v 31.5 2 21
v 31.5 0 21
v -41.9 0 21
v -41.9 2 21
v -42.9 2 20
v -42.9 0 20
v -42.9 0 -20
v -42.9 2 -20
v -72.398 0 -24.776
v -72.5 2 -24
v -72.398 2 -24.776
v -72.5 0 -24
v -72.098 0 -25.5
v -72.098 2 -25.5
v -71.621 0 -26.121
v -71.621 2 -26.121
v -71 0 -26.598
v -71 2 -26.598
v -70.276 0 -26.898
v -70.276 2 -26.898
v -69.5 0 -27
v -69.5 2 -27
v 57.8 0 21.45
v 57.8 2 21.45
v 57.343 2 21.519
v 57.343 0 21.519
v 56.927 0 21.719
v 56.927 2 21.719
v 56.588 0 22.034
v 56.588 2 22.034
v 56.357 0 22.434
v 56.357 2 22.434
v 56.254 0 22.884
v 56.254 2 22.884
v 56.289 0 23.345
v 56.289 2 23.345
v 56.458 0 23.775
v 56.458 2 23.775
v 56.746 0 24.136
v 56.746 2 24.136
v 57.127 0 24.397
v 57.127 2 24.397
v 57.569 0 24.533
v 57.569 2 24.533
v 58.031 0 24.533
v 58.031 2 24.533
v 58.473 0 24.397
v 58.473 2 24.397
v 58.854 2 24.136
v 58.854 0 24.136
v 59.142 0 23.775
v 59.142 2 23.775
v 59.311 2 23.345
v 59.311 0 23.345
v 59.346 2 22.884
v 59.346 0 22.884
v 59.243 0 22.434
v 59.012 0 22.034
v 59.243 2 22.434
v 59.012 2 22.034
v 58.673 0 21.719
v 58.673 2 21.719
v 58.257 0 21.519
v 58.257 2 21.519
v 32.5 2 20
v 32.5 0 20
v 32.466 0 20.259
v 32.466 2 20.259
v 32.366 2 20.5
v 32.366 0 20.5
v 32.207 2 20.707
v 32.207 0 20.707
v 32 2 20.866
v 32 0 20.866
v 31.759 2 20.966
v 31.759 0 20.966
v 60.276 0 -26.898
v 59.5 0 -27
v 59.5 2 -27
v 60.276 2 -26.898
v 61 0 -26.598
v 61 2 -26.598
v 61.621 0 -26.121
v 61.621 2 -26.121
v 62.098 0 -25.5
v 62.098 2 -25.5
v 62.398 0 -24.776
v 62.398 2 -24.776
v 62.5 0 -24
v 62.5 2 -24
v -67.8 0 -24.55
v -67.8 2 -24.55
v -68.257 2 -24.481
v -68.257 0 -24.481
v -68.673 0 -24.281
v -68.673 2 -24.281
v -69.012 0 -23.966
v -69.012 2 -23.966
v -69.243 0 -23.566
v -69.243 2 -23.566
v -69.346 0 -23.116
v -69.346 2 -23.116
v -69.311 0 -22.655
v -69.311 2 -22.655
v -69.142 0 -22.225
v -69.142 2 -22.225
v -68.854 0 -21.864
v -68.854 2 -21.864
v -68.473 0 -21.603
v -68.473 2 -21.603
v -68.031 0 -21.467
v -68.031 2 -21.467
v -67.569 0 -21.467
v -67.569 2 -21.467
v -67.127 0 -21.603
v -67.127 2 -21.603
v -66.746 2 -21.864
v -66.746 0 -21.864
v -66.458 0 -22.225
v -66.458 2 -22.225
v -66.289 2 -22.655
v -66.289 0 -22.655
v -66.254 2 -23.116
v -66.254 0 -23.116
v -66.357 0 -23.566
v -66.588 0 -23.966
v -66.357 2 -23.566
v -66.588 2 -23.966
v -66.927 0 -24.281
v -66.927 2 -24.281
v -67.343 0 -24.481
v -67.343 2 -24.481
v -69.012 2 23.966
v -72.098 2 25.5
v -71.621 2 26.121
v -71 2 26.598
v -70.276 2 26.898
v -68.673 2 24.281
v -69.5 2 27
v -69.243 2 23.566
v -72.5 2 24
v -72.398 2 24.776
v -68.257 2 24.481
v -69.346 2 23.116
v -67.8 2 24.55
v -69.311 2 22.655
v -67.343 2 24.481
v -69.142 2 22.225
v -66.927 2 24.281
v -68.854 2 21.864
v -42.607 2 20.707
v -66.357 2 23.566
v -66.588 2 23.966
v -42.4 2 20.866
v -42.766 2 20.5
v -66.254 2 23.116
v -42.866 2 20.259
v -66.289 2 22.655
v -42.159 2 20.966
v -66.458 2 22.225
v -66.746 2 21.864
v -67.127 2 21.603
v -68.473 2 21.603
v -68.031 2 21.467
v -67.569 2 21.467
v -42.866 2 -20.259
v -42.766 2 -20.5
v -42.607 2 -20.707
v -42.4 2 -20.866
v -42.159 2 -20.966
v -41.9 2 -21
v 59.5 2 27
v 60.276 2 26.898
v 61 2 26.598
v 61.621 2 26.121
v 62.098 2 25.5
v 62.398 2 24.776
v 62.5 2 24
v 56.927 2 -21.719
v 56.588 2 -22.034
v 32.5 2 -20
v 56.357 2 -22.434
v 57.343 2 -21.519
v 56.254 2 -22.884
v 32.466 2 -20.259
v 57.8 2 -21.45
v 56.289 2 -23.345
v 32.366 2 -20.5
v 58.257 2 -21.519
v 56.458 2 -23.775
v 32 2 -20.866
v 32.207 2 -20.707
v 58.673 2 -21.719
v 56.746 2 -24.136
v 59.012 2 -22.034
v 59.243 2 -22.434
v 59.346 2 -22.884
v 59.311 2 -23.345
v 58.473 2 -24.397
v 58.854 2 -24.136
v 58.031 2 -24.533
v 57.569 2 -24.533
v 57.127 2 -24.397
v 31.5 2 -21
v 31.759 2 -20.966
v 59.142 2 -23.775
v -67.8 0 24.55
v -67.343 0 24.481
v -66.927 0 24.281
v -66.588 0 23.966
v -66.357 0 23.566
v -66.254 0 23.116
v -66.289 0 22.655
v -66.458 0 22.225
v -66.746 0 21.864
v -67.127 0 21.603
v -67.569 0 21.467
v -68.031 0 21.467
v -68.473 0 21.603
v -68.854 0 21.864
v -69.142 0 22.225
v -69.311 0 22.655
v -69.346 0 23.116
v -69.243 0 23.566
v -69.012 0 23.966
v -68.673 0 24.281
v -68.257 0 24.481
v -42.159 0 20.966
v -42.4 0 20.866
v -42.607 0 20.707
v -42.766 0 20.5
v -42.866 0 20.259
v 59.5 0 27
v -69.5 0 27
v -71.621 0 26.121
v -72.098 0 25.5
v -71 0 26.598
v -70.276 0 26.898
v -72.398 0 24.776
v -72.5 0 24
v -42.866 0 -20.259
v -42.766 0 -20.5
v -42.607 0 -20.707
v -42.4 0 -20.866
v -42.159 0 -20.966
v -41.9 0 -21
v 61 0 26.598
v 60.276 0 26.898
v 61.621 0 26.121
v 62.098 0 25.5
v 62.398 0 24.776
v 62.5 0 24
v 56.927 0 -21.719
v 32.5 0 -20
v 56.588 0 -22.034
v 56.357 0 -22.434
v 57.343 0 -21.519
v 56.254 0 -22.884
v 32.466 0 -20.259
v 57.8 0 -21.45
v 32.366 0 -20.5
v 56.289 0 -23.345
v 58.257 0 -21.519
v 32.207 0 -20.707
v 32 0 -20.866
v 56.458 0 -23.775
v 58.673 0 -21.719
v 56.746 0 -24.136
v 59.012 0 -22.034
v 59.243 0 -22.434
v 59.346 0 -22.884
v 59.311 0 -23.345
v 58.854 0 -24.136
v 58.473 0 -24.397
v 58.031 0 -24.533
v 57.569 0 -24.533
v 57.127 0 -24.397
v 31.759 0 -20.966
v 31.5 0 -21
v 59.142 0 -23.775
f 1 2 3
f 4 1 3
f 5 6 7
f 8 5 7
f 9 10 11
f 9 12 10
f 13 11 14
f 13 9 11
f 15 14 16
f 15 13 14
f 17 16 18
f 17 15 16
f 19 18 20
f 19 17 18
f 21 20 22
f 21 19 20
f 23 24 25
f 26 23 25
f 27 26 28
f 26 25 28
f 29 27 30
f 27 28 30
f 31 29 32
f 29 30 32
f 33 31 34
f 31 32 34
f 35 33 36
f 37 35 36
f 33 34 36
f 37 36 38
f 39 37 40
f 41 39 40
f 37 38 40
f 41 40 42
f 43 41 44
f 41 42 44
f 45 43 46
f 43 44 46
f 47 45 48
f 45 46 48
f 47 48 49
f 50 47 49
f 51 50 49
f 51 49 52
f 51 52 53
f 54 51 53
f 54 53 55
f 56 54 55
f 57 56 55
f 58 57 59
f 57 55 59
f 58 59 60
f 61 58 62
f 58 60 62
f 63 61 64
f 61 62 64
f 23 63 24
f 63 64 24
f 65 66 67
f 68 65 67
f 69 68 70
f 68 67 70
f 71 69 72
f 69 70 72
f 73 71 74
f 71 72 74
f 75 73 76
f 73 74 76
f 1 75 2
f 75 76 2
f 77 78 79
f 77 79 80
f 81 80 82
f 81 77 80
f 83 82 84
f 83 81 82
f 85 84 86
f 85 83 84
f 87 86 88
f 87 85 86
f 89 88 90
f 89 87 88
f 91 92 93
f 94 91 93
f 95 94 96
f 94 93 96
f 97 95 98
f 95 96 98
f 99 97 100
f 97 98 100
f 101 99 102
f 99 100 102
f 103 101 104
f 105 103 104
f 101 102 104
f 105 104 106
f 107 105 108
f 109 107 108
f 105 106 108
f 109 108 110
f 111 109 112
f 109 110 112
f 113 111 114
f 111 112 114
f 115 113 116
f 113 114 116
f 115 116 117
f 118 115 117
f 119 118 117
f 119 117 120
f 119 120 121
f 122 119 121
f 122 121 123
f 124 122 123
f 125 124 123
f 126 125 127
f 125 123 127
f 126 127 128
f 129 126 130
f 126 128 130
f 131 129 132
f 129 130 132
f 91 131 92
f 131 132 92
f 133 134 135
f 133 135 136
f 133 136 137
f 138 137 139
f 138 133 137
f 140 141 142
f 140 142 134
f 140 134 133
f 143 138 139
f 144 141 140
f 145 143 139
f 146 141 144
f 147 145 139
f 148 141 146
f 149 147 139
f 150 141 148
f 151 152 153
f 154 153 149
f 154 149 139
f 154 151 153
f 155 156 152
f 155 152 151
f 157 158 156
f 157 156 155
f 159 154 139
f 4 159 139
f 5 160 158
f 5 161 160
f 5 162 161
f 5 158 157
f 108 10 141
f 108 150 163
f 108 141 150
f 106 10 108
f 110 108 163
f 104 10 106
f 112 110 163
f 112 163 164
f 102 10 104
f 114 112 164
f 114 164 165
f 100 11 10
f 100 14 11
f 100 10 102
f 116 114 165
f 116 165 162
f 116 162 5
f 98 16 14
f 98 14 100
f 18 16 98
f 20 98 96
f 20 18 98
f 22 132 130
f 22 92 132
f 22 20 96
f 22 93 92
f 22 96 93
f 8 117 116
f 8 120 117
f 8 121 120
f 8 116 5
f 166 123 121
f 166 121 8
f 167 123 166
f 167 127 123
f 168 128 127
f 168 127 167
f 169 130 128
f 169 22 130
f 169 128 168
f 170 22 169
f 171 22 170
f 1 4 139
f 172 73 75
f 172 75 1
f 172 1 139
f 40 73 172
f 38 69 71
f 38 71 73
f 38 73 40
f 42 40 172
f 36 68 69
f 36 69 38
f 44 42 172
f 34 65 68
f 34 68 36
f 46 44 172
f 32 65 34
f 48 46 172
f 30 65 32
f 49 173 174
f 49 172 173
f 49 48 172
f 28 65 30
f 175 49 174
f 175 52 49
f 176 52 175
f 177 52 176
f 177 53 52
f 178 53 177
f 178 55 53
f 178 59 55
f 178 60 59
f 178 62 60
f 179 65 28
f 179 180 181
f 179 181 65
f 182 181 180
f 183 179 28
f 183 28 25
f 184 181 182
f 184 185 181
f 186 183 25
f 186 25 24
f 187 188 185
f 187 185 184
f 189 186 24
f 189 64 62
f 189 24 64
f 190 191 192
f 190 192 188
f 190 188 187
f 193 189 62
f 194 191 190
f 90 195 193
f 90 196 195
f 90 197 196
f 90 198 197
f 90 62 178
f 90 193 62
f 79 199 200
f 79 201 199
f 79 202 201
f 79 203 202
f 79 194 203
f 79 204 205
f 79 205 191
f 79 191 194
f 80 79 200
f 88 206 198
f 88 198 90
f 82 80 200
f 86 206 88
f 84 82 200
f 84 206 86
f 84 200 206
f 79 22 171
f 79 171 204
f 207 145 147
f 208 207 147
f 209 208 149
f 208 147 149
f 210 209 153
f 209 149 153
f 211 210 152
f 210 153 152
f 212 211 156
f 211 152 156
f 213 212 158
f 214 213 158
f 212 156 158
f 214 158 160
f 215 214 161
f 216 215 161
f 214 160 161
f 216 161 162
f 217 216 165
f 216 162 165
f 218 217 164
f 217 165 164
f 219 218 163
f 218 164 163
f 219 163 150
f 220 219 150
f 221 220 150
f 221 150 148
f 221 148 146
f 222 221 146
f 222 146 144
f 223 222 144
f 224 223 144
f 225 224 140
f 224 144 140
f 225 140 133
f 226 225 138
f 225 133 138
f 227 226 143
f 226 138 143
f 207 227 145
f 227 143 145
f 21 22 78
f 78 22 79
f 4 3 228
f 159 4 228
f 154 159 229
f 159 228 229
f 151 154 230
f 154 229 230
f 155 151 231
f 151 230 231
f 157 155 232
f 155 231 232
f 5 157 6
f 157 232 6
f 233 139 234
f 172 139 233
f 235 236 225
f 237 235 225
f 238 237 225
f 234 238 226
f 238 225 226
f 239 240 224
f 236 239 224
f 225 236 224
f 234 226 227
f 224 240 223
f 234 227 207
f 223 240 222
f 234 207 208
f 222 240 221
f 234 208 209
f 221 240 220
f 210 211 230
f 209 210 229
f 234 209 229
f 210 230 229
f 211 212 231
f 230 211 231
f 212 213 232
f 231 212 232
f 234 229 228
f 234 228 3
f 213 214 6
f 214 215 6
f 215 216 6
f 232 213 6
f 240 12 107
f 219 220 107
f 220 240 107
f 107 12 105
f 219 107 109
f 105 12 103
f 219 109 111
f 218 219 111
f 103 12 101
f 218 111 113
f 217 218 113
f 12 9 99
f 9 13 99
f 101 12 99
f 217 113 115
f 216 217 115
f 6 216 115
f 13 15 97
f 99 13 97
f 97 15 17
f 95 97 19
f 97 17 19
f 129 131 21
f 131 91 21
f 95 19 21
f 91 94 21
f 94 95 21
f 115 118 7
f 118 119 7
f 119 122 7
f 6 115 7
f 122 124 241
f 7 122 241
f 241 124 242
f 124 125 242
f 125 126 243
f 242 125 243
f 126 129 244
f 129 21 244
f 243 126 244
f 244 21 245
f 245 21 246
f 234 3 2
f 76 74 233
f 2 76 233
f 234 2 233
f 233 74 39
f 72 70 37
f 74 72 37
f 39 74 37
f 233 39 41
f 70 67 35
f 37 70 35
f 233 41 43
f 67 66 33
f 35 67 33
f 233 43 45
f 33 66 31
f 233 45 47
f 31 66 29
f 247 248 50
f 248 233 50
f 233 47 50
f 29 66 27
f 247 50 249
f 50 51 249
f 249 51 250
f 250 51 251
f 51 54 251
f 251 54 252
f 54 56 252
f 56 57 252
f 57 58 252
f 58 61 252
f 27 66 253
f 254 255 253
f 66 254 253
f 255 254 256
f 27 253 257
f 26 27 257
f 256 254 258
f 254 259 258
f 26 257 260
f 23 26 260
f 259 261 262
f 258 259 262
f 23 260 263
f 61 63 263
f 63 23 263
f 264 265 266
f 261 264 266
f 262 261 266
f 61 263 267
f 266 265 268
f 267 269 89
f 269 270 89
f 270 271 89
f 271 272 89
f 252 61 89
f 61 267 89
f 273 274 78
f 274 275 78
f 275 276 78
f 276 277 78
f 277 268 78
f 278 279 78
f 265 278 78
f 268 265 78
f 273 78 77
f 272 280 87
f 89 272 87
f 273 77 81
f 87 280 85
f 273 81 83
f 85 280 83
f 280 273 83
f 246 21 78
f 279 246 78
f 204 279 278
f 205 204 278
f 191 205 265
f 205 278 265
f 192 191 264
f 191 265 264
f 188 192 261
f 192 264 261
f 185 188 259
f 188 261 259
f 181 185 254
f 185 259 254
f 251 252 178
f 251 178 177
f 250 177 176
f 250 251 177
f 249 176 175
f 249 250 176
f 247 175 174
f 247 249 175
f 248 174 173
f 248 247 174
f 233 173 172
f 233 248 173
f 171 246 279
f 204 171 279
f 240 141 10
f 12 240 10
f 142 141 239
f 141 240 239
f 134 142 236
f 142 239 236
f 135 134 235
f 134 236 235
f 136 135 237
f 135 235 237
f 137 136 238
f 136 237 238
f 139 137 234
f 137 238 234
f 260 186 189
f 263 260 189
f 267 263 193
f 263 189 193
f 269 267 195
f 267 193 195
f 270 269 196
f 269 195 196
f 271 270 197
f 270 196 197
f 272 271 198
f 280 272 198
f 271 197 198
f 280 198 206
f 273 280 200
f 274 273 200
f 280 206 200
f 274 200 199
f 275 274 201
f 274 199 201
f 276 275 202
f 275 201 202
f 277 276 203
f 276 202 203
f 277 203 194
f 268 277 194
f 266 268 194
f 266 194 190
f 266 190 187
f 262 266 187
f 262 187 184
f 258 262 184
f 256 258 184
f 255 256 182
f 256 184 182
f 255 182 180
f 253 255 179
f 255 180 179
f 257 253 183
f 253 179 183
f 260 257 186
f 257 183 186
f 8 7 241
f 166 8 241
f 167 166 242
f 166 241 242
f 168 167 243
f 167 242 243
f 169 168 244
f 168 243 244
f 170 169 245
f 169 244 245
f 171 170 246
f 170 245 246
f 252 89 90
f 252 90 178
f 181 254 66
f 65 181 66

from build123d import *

# Parameters (mm, degrees)
EXTRUDE_1_DEPTH     = 2
SKETCH_3_W          = 10
SKETCH_3_H          = 54
EXTRUDE_2_DEPTH     = 2
SKETCH_2_R          = 1.55
CUT_EXTRUDE_1_DEPTH = 2
FILLET_1_R          = 3


with BuildPart() as part:
    # 草图1 → 凸台-拉伸1 (new body)
    with BuildSketch(Plane(origin=(0, 0, 0), x_dir=(1, 0, 0), z_dir=(0, 1, 0))):
        with BuildLine():
            Line((-59.5, -27), (-62.5, -27))
            Line((-62.5, -27), (-62.5, -24))
            Line((-62.5, -24), (-62.5, 24))
            Line((-62.5, 24), (-62.5, 27))
            Line((-62.5, 27), (-59.5, 27))
            Line((-59.5, 27), (59.5, 27))
            ThreePointArc((59.5, 27), (61.621320344, 26.121320344), (62.5, 24))
            Line((62.5, 24), (62.5, -24))
            ThreePointArc((62.5, -24), (61.621320344, -26.121320344), (59.5, -27))
            Line((59.5, -27), (-59.5, -27))
        make_face()
        with BuildLine():
            Line((-41.9, 21), (31.5, 21))
            ThreePointArc((31.5, 21), (32.207106781, 20.707106781), (32.5, 20))
            Line((32.5, 20), (32.5, -20))
            ThreePointArc((32.5, -20), (32.207106781, -20.707106781), (31.5, -21))
            Line((31.5, -21), (-41.9, -21))
            ThreePointArc((-41.9, -21), (-42.607106781, -20.707106781), (-42.9, -20))
            Line((-42.9, -20), (-42.9, 20))
            ThreePointArc((-42.9, 20), (-42.607106781, 20.707106781), (-41.9, 21))
        make_face(mode=Mode.SUBTRACT)
    extrude(amount=EXTRUDE_1_DEPTH)

    # 草图3 → 凸台-拉伸2 (add)
    with BuildSketch(Plane(origin=(0, 2, 0), x_dir=(1, 0, 0), z_dir=(0, 1, 0))):
        with Locations((-67.5, 0)):
            Rectangle(SKETCH_3_W, SKETCH_3_H)
    extrude(amount=-EXTRUDE_2_DEPTH)

    # 草图2 → 切除-拉伸1 (cut)
    with BuildSketch(Plane(origin=(0, 2, 0), x_dir=(1, 0, 0), z_dir=(0, 1, 0))):
        with Locations(Location((57.8, 23, 0), (0, 0, 270))):
            Circle(SKETCH_2_R)
        with Locations(Location((57.8, -23, 0), (0, 0, 90))):
            Circle(SKETCH_2_R)
        with Locations(Location((-67.8, -23, 0), (0, 0, 270))):
            Circle(SKETCH_2_R)
        with Locations(Location((-67.8, 23, 0), (0, 0, 90))):
            Circle(SKETCH_2_R)
    extrude(amount=-CUT_EXTRUDE_1_DEPTH, mode=Mode.SUBTRACT)

    # 圆角1
    fillet_1_edges = [part.edges().sort_by_distance(p)[0] for p in [
        (-72.5, 1, -27),
        (-72.5, 1, 27),
    ]]
    fillet(fillet_1_edges, radius=FILLET_1_R)


solid = part.part
